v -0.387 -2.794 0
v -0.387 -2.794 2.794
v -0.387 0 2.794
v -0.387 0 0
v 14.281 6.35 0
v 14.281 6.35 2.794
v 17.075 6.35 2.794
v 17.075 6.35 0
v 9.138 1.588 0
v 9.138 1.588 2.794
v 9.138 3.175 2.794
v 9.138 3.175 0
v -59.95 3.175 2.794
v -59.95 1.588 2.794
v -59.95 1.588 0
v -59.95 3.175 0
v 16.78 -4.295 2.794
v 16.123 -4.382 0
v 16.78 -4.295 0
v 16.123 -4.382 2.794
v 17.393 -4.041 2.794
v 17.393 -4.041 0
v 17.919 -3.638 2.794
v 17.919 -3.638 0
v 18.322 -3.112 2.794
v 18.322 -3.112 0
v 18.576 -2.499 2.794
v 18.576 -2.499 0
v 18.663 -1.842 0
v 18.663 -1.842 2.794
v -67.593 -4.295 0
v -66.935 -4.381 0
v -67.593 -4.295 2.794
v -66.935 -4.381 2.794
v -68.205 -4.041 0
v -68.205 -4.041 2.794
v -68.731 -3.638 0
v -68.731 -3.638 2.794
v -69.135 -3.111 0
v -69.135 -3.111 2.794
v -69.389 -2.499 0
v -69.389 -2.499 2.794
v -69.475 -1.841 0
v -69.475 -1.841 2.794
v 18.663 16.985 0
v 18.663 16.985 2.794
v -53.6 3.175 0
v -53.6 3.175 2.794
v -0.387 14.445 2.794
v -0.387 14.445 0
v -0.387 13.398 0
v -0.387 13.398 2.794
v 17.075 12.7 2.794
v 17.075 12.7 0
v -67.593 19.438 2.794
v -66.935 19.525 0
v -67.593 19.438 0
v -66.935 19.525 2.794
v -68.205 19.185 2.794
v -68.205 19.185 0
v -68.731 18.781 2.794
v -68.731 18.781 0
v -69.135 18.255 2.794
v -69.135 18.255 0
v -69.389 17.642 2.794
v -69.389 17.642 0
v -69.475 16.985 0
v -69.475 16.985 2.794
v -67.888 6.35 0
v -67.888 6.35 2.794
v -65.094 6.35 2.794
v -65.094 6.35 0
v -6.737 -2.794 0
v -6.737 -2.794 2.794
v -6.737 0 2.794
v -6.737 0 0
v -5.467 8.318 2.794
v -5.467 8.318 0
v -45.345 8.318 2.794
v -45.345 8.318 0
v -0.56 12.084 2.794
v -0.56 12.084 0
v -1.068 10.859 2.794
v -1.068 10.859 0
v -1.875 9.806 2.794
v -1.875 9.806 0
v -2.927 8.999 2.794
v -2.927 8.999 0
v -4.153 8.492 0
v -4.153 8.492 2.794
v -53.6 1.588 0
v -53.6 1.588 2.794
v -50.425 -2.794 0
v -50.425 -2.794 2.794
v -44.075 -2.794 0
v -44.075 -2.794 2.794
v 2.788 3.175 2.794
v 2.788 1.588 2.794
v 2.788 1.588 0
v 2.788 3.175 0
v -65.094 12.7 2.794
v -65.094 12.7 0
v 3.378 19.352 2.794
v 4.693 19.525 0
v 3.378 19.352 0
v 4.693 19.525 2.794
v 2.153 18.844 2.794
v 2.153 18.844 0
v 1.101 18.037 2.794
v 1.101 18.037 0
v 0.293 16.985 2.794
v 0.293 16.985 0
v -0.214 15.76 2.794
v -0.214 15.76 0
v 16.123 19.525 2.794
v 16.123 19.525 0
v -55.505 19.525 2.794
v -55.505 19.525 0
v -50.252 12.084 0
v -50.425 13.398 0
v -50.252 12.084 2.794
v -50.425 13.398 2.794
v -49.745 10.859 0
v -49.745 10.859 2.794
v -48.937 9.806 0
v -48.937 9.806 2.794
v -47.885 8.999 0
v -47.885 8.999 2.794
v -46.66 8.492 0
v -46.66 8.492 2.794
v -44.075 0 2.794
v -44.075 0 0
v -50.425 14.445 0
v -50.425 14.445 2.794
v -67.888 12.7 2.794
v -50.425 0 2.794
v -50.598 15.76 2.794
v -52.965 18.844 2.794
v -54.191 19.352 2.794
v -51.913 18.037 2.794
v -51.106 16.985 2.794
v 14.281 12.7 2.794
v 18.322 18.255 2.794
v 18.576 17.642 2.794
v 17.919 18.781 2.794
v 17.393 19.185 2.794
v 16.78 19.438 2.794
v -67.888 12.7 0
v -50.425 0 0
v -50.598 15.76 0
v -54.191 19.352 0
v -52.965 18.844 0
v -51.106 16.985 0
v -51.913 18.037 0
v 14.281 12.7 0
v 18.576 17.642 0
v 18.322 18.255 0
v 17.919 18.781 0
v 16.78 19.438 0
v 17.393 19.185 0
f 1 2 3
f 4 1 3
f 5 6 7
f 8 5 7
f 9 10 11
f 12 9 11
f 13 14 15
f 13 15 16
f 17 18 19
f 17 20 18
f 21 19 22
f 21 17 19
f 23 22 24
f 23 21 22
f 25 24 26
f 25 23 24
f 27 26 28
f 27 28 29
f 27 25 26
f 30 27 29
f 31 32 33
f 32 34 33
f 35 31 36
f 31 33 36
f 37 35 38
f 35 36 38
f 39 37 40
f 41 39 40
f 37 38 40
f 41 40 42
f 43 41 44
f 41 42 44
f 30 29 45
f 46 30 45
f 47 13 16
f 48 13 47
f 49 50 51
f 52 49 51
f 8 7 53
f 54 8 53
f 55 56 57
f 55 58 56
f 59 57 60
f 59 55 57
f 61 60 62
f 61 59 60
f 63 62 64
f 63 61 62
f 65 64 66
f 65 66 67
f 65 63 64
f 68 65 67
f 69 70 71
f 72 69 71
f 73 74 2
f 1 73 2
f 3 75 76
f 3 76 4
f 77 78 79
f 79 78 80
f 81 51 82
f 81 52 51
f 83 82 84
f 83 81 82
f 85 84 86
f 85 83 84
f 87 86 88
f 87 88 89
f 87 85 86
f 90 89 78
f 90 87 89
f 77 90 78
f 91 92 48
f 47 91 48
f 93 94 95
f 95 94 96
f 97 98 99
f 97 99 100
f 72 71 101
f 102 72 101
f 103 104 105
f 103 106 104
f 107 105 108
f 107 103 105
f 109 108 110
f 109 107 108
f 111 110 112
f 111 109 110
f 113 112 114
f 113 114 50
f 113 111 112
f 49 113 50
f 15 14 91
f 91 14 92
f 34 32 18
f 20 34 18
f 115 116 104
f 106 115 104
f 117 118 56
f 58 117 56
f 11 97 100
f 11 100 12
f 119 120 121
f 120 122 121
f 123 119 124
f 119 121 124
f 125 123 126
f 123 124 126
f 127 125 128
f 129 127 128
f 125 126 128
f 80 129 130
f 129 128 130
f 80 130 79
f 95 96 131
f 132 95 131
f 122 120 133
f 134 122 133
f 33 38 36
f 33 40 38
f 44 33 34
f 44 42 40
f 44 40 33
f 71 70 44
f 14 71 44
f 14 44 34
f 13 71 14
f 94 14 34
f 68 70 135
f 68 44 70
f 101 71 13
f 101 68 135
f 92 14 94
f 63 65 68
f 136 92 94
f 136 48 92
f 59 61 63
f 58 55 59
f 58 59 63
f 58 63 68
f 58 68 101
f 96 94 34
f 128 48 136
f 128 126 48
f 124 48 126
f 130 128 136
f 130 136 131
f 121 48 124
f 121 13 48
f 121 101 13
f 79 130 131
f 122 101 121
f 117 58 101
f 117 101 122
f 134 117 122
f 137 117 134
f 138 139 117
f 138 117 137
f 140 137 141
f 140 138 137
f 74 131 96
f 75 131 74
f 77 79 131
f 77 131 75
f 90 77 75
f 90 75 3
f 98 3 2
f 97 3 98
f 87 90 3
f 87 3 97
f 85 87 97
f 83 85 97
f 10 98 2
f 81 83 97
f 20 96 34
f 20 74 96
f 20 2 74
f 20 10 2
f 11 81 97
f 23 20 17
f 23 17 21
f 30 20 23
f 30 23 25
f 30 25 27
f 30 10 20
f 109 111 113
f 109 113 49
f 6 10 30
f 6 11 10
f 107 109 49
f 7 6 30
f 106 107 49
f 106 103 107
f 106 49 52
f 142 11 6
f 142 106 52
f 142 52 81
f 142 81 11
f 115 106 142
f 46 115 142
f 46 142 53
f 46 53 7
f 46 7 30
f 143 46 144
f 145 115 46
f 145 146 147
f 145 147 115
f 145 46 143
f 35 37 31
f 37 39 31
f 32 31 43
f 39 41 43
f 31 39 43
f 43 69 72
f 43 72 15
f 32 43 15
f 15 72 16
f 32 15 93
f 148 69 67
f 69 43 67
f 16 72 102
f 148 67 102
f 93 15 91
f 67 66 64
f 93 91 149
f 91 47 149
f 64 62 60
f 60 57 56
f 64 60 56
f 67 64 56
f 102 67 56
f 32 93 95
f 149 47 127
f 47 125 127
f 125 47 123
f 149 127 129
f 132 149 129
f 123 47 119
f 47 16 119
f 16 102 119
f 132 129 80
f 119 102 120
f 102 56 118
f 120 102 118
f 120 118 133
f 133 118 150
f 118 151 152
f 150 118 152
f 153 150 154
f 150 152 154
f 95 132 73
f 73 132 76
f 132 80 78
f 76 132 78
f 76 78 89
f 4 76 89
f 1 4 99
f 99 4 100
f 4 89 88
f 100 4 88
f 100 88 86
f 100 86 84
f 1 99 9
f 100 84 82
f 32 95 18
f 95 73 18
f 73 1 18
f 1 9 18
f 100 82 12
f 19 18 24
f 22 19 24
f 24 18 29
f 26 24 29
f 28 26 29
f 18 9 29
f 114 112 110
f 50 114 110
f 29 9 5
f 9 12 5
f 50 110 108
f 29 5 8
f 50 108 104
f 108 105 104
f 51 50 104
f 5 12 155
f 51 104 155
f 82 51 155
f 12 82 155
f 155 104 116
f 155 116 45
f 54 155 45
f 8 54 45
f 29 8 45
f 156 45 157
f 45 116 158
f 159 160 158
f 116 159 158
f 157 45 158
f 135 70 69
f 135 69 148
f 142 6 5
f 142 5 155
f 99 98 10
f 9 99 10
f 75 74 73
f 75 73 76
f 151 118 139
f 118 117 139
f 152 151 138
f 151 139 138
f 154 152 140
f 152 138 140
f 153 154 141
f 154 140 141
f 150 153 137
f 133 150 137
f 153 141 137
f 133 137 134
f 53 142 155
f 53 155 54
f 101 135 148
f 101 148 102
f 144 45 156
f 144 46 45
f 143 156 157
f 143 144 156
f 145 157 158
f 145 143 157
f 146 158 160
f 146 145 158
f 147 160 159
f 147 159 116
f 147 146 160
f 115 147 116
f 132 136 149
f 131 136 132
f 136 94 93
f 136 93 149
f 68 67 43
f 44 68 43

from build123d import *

# Parameters (mm, degrees)
BOSS_EXTRUDE1_DEPTH = 2.794
FILLET1_R           = 2.54
FILLET2_R           = 5.08
SKETCH2_W           = 6.35
SKETCH2_H           = 2.794
SKETCH2_W_2         = 2.794
SKETCH2_H_2         = 6.35
SKETCH2_H_3         = 1.5875
CUT_EXTRUDE1_DEPTH  = 73.220895192


with BuildPart() as part:
    # Sketch1 → Boss-Extrude1 (new body)
    with BuildSketch(Plane.XY):
        Polygon((-69.475359958, -4.3815), (18.662640042, -4.3815), (18.662640042, 19.525), (-0.387359958, 19.525), (-0.387359958, 8.3185), (-50.425359958, 8.3185), (-50.425359958, 19.525), (-69.475359958, 19.525), align=None)
    extrude(amount=BOSS_EXTRUDE1_DEPTH)

    # Fillet1
    fillet1_edges = [part.edges().sort_by_distance(p)[0] for p in [
        (18.662640042, -4.3815, 1.397),
        (-69.475359958, -4.3815, 1.397),
        (-69.475359958, 19.525, 1.397),
        (18.662640042, 19.525, 1.397),
    ]]
    fillet(fillet1_edges, radius=FILLET1_R)

    # Fillet2
    fillet2_edges = [part.edges().sort_by_distance(p)[0] for p in [
        (-50.425359958, 19.525, 1.397),
        (-50.425359958, 8.3185, 1.397),
        (-0.387359958, 8.3185, 1.397),
        (-0.387359958, 19.525, 1.397),
    ]]
    fillet(fillet2_edges, radius=FILLET2_R)

    # Sketch2 → Cut-Extrude1 (cut, through all)
    with BuildSketch(Plane.XY.offset(2.794)):
        with Locations((-47.250359958, -1.397)):
            Rectangle(SKETCH2_W, SKETCH2_H)
        with Locations((-3.562359958, -1.397)):
            Rectangle(SKETCH2_W, SKETCH2_H)
        with Locations((15.678140042, 9.525)):
            Rectangle(SKETCH2_W_2, SKETCH2_H_2)
        with Locations((-66.490859958, 9.525)):
            Rectangle(SKETCH2_W_2, SKETCH2_H_2)
        with Locations((5.962640042, 2.38125)):
            Rectangle(SKETCH2_W, SKETCH2_H_3)
        with Locations((-56.775359958, 2.38125)):
            Rectangle(SKETCH2_W, SKETCH2_H_3)
    extrude(amount=-CUT_EXTRUDE1_DEPTH, mode=Mode.SUBTRACT)


solid = part.part
